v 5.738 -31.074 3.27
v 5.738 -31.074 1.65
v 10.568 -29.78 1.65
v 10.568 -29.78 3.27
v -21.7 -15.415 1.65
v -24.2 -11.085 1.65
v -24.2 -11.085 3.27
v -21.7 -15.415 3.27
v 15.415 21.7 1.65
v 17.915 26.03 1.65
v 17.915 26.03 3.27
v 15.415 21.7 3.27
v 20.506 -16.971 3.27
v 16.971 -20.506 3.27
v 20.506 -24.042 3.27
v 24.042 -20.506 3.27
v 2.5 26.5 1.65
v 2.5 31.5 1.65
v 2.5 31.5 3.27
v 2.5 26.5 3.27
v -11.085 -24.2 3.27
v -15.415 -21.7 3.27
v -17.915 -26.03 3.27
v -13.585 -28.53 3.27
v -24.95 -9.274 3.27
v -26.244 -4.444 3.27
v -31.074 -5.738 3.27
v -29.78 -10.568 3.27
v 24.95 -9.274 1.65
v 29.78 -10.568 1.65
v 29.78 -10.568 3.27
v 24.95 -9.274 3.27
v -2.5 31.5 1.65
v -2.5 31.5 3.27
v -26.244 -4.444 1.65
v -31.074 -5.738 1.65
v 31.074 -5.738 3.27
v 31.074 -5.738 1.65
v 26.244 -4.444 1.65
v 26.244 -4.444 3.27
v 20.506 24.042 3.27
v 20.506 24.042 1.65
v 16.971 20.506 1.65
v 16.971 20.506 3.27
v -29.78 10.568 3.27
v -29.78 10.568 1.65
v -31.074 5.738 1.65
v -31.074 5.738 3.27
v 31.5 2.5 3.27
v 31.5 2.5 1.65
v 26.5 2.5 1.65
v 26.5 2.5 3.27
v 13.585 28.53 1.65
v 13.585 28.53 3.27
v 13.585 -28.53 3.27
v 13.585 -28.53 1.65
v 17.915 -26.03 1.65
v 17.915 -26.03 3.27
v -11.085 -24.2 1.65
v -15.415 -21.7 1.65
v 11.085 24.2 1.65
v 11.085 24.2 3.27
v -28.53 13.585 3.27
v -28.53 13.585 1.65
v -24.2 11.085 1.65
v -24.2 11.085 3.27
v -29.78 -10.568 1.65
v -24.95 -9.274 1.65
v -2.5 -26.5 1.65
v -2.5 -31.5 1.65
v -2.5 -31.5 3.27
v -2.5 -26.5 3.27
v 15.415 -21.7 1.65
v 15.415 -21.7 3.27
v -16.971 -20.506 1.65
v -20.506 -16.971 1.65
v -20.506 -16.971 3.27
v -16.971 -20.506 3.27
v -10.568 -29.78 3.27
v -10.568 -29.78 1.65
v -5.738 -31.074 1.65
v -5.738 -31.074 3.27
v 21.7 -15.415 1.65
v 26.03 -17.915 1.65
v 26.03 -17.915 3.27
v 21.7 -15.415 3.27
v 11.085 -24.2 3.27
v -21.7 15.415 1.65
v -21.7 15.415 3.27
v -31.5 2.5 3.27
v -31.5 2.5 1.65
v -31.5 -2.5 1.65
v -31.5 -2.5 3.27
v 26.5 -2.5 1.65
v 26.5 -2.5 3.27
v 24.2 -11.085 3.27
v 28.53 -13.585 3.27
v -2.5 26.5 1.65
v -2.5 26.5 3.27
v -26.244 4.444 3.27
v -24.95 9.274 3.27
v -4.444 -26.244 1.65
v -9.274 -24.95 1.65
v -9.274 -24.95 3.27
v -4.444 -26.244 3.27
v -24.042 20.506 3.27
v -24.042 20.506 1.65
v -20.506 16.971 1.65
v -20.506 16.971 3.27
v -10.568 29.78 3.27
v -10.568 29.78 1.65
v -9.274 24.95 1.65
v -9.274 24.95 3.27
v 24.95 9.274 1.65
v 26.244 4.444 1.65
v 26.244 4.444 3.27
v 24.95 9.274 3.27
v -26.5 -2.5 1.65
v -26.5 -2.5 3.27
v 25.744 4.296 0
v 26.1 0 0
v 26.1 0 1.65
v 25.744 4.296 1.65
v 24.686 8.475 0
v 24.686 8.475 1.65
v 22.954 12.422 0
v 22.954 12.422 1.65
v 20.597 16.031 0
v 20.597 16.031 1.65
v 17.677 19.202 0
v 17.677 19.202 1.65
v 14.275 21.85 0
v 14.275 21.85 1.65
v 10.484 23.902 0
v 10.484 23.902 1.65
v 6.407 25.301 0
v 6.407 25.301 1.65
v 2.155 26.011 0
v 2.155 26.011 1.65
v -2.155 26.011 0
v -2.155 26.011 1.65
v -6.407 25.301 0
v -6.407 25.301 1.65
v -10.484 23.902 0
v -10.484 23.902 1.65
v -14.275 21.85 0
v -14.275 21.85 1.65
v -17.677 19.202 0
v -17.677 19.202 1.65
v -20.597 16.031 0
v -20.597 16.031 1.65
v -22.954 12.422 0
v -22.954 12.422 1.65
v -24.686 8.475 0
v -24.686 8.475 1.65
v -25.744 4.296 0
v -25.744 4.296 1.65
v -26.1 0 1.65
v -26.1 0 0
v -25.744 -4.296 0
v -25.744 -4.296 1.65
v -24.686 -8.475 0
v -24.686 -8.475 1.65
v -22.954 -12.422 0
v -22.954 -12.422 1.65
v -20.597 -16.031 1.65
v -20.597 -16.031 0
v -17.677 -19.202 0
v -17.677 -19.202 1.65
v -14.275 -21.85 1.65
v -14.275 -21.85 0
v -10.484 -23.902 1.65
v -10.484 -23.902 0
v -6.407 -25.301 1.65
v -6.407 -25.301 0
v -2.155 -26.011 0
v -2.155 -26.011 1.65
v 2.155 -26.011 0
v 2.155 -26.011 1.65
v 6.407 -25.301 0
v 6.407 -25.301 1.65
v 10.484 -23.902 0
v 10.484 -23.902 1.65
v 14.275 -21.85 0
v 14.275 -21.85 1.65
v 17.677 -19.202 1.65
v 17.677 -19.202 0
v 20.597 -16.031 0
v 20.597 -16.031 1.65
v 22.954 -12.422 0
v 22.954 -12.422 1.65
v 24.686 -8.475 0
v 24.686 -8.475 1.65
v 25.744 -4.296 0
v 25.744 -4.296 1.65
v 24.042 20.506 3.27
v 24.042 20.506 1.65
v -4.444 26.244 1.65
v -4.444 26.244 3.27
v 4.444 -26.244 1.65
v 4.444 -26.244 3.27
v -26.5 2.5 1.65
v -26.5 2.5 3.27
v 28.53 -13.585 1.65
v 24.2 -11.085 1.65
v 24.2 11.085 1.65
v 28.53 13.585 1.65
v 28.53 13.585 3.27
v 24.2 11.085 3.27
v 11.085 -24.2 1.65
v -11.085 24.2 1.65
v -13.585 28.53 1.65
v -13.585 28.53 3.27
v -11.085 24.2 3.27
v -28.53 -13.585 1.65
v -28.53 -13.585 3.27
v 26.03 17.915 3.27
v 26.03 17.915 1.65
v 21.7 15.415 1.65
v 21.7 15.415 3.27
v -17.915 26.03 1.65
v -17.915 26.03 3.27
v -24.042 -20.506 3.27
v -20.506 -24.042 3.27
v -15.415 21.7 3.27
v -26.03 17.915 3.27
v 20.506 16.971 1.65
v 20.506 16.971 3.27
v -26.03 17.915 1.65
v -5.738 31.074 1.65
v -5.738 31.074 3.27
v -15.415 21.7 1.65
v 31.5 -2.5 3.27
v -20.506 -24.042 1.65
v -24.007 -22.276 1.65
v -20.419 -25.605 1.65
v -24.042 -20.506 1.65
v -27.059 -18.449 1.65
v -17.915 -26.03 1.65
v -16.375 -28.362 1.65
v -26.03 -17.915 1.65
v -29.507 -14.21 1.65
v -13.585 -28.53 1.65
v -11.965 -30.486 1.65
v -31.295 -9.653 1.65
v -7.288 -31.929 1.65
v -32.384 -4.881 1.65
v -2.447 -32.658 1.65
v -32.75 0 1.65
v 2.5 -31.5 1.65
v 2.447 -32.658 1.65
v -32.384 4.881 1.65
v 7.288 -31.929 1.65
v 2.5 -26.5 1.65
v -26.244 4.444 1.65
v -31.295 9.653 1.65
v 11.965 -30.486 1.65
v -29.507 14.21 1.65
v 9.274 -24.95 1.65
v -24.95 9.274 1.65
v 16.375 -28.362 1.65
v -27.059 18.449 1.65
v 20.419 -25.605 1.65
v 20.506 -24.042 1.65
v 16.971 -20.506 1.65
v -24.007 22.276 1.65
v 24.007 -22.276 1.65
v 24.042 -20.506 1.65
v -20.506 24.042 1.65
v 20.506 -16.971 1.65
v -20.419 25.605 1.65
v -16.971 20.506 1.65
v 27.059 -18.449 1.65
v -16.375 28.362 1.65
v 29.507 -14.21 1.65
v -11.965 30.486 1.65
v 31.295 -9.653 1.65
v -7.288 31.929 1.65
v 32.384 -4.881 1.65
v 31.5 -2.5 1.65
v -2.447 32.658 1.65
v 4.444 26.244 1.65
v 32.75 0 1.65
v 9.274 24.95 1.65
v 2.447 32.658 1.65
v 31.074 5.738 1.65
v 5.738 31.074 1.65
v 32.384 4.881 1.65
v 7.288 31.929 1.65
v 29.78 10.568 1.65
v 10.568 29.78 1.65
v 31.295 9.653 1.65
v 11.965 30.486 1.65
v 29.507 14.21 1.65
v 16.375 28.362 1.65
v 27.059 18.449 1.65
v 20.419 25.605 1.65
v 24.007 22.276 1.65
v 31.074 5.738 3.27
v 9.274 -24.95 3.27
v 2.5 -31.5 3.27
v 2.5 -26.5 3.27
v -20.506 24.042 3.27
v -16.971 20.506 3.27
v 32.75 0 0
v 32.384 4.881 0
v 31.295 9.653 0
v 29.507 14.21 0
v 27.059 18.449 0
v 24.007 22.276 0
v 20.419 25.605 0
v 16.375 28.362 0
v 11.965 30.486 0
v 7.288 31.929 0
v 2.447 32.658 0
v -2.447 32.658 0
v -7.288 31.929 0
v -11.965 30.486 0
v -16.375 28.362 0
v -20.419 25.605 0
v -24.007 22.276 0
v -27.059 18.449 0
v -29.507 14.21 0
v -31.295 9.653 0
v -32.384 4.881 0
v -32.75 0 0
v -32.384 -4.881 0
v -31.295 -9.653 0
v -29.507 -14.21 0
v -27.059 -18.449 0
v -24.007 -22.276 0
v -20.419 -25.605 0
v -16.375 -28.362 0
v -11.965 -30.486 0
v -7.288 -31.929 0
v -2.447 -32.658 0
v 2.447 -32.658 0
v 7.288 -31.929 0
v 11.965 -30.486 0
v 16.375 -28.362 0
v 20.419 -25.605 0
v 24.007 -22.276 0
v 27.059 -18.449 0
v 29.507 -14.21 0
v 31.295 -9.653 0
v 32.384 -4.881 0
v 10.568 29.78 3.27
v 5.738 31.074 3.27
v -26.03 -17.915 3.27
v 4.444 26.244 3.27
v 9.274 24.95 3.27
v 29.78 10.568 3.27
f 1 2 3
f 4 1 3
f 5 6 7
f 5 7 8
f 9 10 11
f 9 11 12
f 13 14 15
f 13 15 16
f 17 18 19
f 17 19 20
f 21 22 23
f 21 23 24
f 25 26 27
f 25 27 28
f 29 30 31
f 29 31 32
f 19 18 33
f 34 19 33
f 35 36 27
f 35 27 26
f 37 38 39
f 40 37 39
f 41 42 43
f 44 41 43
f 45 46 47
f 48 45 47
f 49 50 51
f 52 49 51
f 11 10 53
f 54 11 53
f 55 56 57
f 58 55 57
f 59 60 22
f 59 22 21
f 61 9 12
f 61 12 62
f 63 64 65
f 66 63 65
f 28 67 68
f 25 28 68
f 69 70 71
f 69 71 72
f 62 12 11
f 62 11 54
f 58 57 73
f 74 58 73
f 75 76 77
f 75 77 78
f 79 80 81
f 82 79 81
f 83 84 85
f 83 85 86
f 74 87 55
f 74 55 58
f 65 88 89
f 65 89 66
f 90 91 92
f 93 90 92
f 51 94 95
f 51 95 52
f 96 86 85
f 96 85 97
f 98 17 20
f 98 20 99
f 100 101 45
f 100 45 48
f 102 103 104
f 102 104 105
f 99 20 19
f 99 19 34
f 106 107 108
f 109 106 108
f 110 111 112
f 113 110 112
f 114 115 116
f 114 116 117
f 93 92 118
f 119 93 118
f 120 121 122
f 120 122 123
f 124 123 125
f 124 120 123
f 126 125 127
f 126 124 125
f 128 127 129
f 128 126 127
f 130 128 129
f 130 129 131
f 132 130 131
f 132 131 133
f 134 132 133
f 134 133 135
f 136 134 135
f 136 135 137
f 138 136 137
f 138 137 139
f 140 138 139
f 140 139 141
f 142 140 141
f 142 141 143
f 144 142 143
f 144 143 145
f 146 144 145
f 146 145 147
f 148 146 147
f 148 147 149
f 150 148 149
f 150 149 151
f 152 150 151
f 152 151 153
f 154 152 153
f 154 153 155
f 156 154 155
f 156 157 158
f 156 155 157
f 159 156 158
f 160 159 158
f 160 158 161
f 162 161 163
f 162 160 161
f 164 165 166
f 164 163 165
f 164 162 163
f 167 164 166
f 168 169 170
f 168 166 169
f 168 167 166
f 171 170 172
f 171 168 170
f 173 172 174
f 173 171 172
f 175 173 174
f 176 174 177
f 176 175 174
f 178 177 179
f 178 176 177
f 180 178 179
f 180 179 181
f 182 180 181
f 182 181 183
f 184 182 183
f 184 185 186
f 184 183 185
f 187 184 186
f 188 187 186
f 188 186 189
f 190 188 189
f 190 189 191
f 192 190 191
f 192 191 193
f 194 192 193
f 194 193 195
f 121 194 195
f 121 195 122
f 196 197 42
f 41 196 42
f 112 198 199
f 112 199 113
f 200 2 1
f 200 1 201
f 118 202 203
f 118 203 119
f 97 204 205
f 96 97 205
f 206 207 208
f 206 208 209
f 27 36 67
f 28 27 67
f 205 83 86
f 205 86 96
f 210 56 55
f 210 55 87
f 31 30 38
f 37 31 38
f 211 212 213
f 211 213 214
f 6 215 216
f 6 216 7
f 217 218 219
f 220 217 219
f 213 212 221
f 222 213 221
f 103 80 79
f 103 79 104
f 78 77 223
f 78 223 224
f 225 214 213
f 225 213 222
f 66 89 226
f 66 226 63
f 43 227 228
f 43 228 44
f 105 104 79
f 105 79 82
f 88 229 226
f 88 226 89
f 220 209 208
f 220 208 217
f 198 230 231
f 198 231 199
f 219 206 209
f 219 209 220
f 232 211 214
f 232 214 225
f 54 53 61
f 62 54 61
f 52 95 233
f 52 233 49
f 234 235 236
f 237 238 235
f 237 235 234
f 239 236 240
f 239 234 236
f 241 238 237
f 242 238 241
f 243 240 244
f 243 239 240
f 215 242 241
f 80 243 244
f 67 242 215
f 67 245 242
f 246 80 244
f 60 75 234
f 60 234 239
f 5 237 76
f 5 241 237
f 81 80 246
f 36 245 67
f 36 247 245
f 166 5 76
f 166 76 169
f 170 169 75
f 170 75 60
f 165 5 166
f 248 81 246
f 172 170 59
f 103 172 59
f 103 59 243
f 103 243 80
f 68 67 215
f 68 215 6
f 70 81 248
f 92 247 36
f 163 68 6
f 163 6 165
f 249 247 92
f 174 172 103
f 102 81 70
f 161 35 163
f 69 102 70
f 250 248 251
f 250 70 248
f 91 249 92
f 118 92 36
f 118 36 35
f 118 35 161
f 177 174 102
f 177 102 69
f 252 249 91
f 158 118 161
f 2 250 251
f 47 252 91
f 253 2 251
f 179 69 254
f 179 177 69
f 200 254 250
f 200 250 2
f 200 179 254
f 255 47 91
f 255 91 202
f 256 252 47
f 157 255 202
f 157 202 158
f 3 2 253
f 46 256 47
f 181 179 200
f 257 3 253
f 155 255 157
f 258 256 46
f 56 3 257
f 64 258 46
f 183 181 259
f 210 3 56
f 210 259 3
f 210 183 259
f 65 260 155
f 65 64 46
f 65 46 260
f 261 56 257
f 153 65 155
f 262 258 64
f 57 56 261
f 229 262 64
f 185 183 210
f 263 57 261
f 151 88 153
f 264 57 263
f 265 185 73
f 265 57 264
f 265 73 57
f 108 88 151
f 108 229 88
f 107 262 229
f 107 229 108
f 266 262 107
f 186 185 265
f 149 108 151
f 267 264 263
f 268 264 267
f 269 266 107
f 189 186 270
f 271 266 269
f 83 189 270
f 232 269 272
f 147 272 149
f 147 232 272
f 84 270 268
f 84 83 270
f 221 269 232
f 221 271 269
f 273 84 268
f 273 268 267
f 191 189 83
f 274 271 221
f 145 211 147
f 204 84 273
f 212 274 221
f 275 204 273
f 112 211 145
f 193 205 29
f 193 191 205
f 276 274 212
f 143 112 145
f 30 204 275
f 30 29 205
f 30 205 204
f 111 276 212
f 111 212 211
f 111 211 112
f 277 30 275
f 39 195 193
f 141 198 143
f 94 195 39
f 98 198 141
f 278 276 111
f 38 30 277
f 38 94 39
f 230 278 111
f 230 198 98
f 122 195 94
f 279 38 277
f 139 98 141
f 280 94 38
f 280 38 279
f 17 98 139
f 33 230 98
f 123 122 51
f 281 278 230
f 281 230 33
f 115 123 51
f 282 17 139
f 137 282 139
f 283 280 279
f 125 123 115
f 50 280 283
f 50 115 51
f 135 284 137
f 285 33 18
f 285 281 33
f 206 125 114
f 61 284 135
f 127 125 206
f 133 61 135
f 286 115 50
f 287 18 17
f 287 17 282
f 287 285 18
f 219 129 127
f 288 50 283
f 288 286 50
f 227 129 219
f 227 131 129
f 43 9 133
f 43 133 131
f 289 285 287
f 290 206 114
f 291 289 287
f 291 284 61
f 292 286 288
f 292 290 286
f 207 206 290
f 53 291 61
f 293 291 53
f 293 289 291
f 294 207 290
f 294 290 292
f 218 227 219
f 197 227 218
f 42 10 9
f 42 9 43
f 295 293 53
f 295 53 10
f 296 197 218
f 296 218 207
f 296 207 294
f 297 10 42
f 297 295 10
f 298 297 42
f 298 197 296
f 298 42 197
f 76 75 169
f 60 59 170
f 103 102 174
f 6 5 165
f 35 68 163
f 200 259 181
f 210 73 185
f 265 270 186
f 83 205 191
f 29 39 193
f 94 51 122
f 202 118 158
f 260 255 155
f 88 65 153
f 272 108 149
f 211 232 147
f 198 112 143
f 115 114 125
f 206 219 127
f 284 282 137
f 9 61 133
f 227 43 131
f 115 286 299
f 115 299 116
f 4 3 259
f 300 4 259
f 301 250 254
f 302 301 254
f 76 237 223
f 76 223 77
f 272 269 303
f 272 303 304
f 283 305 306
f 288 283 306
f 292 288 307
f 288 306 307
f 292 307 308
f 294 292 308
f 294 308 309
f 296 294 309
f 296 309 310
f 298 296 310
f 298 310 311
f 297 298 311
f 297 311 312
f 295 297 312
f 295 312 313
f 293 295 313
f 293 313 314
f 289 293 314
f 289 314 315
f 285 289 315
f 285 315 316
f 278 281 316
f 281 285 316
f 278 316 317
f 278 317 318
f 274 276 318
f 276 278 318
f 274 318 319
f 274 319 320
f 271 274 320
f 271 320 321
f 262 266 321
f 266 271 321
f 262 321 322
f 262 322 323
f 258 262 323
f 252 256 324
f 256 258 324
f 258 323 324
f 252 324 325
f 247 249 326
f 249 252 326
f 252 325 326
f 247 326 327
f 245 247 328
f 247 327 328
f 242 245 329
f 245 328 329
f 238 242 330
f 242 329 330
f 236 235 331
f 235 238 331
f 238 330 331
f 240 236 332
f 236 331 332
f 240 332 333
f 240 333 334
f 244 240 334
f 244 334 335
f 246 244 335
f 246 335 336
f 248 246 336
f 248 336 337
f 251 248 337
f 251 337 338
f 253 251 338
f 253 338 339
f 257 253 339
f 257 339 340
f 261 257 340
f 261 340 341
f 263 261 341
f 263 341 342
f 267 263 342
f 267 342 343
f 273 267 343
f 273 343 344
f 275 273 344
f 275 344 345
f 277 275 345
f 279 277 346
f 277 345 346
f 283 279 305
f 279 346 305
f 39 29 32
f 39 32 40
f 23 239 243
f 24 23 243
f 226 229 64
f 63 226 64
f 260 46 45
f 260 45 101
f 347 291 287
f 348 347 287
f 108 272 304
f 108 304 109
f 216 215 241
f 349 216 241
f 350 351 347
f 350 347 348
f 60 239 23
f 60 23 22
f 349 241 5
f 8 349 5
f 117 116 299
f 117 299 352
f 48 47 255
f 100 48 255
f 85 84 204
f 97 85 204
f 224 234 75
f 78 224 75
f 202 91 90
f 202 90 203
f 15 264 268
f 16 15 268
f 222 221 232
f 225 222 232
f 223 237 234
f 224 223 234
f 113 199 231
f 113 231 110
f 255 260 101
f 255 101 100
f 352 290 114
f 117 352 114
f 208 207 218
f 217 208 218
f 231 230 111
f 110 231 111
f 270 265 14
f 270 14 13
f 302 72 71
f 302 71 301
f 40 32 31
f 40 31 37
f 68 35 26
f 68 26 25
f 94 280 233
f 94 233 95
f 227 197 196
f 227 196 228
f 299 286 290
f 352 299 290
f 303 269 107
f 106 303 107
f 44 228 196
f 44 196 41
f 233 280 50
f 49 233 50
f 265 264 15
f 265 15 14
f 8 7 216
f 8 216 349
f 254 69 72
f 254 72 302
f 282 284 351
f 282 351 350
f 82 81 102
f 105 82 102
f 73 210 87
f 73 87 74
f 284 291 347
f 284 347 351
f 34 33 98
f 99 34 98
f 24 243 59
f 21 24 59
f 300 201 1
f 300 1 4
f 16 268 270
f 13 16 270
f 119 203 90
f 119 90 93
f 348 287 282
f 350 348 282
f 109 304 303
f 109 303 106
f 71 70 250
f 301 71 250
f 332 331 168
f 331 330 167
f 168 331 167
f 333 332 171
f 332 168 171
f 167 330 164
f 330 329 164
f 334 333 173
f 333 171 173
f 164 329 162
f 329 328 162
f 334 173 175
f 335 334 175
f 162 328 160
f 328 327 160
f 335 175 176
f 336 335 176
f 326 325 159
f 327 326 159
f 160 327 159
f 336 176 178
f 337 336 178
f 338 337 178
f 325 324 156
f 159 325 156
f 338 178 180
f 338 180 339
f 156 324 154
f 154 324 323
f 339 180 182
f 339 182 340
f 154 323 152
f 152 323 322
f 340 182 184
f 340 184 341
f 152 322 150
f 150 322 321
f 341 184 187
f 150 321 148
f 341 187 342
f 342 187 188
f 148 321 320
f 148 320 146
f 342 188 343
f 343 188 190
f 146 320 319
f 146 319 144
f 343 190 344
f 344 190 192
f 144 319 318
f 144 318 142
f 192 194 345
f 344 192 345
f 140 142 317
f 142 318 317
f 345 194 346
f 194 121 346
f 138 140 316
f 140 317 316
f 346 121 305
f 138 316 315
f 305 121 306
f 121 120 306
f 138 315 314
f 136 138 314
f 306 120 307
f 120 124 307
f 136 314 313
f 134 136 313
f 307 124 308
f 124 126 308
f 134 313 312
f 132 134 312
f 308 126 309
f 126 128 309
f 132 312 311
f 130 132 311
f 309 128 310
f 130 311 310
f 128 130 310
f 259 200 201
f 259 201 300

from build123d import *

# Parameters (mm, degrees)
F0_R     = 32.75
F0_R_2   = 26.1
F1_DEPTH = 1.65
F2_W     = 5
F2_H     = 5
F3_DEPTH = 1.62
F4_COUNT = 24


with BuildPart() as f1:
    # F0 (on Top) → F1 (new body)
    with BuildSketch(Plane.XY):
        Circle(F0_R)
        Circle(F0_R_2, mode=Mode.SUBTRACT)
    extrude(amount=F1_DEPTH)

    # F2 (on face) → F3 (join)
    with BuildSketch(Plane.XY.offset(1.65)):
        with Locations((0, -29)):
            Rectangle(F2_W, F2_H)
    extrude(amount=F3_DEPTH)

    # F4: F1 ×24 about axis
    f4_axis = Axis((0, 0, 1.65), (0, 0, 1))


with BuildPart() as f1_1:
    add(f1.part)
    for i in range(1, F4_COUNT):
        add(f1.part.rotate(f4_axis, i * 360 / F4_COUNT))


solid = f1_1.part
